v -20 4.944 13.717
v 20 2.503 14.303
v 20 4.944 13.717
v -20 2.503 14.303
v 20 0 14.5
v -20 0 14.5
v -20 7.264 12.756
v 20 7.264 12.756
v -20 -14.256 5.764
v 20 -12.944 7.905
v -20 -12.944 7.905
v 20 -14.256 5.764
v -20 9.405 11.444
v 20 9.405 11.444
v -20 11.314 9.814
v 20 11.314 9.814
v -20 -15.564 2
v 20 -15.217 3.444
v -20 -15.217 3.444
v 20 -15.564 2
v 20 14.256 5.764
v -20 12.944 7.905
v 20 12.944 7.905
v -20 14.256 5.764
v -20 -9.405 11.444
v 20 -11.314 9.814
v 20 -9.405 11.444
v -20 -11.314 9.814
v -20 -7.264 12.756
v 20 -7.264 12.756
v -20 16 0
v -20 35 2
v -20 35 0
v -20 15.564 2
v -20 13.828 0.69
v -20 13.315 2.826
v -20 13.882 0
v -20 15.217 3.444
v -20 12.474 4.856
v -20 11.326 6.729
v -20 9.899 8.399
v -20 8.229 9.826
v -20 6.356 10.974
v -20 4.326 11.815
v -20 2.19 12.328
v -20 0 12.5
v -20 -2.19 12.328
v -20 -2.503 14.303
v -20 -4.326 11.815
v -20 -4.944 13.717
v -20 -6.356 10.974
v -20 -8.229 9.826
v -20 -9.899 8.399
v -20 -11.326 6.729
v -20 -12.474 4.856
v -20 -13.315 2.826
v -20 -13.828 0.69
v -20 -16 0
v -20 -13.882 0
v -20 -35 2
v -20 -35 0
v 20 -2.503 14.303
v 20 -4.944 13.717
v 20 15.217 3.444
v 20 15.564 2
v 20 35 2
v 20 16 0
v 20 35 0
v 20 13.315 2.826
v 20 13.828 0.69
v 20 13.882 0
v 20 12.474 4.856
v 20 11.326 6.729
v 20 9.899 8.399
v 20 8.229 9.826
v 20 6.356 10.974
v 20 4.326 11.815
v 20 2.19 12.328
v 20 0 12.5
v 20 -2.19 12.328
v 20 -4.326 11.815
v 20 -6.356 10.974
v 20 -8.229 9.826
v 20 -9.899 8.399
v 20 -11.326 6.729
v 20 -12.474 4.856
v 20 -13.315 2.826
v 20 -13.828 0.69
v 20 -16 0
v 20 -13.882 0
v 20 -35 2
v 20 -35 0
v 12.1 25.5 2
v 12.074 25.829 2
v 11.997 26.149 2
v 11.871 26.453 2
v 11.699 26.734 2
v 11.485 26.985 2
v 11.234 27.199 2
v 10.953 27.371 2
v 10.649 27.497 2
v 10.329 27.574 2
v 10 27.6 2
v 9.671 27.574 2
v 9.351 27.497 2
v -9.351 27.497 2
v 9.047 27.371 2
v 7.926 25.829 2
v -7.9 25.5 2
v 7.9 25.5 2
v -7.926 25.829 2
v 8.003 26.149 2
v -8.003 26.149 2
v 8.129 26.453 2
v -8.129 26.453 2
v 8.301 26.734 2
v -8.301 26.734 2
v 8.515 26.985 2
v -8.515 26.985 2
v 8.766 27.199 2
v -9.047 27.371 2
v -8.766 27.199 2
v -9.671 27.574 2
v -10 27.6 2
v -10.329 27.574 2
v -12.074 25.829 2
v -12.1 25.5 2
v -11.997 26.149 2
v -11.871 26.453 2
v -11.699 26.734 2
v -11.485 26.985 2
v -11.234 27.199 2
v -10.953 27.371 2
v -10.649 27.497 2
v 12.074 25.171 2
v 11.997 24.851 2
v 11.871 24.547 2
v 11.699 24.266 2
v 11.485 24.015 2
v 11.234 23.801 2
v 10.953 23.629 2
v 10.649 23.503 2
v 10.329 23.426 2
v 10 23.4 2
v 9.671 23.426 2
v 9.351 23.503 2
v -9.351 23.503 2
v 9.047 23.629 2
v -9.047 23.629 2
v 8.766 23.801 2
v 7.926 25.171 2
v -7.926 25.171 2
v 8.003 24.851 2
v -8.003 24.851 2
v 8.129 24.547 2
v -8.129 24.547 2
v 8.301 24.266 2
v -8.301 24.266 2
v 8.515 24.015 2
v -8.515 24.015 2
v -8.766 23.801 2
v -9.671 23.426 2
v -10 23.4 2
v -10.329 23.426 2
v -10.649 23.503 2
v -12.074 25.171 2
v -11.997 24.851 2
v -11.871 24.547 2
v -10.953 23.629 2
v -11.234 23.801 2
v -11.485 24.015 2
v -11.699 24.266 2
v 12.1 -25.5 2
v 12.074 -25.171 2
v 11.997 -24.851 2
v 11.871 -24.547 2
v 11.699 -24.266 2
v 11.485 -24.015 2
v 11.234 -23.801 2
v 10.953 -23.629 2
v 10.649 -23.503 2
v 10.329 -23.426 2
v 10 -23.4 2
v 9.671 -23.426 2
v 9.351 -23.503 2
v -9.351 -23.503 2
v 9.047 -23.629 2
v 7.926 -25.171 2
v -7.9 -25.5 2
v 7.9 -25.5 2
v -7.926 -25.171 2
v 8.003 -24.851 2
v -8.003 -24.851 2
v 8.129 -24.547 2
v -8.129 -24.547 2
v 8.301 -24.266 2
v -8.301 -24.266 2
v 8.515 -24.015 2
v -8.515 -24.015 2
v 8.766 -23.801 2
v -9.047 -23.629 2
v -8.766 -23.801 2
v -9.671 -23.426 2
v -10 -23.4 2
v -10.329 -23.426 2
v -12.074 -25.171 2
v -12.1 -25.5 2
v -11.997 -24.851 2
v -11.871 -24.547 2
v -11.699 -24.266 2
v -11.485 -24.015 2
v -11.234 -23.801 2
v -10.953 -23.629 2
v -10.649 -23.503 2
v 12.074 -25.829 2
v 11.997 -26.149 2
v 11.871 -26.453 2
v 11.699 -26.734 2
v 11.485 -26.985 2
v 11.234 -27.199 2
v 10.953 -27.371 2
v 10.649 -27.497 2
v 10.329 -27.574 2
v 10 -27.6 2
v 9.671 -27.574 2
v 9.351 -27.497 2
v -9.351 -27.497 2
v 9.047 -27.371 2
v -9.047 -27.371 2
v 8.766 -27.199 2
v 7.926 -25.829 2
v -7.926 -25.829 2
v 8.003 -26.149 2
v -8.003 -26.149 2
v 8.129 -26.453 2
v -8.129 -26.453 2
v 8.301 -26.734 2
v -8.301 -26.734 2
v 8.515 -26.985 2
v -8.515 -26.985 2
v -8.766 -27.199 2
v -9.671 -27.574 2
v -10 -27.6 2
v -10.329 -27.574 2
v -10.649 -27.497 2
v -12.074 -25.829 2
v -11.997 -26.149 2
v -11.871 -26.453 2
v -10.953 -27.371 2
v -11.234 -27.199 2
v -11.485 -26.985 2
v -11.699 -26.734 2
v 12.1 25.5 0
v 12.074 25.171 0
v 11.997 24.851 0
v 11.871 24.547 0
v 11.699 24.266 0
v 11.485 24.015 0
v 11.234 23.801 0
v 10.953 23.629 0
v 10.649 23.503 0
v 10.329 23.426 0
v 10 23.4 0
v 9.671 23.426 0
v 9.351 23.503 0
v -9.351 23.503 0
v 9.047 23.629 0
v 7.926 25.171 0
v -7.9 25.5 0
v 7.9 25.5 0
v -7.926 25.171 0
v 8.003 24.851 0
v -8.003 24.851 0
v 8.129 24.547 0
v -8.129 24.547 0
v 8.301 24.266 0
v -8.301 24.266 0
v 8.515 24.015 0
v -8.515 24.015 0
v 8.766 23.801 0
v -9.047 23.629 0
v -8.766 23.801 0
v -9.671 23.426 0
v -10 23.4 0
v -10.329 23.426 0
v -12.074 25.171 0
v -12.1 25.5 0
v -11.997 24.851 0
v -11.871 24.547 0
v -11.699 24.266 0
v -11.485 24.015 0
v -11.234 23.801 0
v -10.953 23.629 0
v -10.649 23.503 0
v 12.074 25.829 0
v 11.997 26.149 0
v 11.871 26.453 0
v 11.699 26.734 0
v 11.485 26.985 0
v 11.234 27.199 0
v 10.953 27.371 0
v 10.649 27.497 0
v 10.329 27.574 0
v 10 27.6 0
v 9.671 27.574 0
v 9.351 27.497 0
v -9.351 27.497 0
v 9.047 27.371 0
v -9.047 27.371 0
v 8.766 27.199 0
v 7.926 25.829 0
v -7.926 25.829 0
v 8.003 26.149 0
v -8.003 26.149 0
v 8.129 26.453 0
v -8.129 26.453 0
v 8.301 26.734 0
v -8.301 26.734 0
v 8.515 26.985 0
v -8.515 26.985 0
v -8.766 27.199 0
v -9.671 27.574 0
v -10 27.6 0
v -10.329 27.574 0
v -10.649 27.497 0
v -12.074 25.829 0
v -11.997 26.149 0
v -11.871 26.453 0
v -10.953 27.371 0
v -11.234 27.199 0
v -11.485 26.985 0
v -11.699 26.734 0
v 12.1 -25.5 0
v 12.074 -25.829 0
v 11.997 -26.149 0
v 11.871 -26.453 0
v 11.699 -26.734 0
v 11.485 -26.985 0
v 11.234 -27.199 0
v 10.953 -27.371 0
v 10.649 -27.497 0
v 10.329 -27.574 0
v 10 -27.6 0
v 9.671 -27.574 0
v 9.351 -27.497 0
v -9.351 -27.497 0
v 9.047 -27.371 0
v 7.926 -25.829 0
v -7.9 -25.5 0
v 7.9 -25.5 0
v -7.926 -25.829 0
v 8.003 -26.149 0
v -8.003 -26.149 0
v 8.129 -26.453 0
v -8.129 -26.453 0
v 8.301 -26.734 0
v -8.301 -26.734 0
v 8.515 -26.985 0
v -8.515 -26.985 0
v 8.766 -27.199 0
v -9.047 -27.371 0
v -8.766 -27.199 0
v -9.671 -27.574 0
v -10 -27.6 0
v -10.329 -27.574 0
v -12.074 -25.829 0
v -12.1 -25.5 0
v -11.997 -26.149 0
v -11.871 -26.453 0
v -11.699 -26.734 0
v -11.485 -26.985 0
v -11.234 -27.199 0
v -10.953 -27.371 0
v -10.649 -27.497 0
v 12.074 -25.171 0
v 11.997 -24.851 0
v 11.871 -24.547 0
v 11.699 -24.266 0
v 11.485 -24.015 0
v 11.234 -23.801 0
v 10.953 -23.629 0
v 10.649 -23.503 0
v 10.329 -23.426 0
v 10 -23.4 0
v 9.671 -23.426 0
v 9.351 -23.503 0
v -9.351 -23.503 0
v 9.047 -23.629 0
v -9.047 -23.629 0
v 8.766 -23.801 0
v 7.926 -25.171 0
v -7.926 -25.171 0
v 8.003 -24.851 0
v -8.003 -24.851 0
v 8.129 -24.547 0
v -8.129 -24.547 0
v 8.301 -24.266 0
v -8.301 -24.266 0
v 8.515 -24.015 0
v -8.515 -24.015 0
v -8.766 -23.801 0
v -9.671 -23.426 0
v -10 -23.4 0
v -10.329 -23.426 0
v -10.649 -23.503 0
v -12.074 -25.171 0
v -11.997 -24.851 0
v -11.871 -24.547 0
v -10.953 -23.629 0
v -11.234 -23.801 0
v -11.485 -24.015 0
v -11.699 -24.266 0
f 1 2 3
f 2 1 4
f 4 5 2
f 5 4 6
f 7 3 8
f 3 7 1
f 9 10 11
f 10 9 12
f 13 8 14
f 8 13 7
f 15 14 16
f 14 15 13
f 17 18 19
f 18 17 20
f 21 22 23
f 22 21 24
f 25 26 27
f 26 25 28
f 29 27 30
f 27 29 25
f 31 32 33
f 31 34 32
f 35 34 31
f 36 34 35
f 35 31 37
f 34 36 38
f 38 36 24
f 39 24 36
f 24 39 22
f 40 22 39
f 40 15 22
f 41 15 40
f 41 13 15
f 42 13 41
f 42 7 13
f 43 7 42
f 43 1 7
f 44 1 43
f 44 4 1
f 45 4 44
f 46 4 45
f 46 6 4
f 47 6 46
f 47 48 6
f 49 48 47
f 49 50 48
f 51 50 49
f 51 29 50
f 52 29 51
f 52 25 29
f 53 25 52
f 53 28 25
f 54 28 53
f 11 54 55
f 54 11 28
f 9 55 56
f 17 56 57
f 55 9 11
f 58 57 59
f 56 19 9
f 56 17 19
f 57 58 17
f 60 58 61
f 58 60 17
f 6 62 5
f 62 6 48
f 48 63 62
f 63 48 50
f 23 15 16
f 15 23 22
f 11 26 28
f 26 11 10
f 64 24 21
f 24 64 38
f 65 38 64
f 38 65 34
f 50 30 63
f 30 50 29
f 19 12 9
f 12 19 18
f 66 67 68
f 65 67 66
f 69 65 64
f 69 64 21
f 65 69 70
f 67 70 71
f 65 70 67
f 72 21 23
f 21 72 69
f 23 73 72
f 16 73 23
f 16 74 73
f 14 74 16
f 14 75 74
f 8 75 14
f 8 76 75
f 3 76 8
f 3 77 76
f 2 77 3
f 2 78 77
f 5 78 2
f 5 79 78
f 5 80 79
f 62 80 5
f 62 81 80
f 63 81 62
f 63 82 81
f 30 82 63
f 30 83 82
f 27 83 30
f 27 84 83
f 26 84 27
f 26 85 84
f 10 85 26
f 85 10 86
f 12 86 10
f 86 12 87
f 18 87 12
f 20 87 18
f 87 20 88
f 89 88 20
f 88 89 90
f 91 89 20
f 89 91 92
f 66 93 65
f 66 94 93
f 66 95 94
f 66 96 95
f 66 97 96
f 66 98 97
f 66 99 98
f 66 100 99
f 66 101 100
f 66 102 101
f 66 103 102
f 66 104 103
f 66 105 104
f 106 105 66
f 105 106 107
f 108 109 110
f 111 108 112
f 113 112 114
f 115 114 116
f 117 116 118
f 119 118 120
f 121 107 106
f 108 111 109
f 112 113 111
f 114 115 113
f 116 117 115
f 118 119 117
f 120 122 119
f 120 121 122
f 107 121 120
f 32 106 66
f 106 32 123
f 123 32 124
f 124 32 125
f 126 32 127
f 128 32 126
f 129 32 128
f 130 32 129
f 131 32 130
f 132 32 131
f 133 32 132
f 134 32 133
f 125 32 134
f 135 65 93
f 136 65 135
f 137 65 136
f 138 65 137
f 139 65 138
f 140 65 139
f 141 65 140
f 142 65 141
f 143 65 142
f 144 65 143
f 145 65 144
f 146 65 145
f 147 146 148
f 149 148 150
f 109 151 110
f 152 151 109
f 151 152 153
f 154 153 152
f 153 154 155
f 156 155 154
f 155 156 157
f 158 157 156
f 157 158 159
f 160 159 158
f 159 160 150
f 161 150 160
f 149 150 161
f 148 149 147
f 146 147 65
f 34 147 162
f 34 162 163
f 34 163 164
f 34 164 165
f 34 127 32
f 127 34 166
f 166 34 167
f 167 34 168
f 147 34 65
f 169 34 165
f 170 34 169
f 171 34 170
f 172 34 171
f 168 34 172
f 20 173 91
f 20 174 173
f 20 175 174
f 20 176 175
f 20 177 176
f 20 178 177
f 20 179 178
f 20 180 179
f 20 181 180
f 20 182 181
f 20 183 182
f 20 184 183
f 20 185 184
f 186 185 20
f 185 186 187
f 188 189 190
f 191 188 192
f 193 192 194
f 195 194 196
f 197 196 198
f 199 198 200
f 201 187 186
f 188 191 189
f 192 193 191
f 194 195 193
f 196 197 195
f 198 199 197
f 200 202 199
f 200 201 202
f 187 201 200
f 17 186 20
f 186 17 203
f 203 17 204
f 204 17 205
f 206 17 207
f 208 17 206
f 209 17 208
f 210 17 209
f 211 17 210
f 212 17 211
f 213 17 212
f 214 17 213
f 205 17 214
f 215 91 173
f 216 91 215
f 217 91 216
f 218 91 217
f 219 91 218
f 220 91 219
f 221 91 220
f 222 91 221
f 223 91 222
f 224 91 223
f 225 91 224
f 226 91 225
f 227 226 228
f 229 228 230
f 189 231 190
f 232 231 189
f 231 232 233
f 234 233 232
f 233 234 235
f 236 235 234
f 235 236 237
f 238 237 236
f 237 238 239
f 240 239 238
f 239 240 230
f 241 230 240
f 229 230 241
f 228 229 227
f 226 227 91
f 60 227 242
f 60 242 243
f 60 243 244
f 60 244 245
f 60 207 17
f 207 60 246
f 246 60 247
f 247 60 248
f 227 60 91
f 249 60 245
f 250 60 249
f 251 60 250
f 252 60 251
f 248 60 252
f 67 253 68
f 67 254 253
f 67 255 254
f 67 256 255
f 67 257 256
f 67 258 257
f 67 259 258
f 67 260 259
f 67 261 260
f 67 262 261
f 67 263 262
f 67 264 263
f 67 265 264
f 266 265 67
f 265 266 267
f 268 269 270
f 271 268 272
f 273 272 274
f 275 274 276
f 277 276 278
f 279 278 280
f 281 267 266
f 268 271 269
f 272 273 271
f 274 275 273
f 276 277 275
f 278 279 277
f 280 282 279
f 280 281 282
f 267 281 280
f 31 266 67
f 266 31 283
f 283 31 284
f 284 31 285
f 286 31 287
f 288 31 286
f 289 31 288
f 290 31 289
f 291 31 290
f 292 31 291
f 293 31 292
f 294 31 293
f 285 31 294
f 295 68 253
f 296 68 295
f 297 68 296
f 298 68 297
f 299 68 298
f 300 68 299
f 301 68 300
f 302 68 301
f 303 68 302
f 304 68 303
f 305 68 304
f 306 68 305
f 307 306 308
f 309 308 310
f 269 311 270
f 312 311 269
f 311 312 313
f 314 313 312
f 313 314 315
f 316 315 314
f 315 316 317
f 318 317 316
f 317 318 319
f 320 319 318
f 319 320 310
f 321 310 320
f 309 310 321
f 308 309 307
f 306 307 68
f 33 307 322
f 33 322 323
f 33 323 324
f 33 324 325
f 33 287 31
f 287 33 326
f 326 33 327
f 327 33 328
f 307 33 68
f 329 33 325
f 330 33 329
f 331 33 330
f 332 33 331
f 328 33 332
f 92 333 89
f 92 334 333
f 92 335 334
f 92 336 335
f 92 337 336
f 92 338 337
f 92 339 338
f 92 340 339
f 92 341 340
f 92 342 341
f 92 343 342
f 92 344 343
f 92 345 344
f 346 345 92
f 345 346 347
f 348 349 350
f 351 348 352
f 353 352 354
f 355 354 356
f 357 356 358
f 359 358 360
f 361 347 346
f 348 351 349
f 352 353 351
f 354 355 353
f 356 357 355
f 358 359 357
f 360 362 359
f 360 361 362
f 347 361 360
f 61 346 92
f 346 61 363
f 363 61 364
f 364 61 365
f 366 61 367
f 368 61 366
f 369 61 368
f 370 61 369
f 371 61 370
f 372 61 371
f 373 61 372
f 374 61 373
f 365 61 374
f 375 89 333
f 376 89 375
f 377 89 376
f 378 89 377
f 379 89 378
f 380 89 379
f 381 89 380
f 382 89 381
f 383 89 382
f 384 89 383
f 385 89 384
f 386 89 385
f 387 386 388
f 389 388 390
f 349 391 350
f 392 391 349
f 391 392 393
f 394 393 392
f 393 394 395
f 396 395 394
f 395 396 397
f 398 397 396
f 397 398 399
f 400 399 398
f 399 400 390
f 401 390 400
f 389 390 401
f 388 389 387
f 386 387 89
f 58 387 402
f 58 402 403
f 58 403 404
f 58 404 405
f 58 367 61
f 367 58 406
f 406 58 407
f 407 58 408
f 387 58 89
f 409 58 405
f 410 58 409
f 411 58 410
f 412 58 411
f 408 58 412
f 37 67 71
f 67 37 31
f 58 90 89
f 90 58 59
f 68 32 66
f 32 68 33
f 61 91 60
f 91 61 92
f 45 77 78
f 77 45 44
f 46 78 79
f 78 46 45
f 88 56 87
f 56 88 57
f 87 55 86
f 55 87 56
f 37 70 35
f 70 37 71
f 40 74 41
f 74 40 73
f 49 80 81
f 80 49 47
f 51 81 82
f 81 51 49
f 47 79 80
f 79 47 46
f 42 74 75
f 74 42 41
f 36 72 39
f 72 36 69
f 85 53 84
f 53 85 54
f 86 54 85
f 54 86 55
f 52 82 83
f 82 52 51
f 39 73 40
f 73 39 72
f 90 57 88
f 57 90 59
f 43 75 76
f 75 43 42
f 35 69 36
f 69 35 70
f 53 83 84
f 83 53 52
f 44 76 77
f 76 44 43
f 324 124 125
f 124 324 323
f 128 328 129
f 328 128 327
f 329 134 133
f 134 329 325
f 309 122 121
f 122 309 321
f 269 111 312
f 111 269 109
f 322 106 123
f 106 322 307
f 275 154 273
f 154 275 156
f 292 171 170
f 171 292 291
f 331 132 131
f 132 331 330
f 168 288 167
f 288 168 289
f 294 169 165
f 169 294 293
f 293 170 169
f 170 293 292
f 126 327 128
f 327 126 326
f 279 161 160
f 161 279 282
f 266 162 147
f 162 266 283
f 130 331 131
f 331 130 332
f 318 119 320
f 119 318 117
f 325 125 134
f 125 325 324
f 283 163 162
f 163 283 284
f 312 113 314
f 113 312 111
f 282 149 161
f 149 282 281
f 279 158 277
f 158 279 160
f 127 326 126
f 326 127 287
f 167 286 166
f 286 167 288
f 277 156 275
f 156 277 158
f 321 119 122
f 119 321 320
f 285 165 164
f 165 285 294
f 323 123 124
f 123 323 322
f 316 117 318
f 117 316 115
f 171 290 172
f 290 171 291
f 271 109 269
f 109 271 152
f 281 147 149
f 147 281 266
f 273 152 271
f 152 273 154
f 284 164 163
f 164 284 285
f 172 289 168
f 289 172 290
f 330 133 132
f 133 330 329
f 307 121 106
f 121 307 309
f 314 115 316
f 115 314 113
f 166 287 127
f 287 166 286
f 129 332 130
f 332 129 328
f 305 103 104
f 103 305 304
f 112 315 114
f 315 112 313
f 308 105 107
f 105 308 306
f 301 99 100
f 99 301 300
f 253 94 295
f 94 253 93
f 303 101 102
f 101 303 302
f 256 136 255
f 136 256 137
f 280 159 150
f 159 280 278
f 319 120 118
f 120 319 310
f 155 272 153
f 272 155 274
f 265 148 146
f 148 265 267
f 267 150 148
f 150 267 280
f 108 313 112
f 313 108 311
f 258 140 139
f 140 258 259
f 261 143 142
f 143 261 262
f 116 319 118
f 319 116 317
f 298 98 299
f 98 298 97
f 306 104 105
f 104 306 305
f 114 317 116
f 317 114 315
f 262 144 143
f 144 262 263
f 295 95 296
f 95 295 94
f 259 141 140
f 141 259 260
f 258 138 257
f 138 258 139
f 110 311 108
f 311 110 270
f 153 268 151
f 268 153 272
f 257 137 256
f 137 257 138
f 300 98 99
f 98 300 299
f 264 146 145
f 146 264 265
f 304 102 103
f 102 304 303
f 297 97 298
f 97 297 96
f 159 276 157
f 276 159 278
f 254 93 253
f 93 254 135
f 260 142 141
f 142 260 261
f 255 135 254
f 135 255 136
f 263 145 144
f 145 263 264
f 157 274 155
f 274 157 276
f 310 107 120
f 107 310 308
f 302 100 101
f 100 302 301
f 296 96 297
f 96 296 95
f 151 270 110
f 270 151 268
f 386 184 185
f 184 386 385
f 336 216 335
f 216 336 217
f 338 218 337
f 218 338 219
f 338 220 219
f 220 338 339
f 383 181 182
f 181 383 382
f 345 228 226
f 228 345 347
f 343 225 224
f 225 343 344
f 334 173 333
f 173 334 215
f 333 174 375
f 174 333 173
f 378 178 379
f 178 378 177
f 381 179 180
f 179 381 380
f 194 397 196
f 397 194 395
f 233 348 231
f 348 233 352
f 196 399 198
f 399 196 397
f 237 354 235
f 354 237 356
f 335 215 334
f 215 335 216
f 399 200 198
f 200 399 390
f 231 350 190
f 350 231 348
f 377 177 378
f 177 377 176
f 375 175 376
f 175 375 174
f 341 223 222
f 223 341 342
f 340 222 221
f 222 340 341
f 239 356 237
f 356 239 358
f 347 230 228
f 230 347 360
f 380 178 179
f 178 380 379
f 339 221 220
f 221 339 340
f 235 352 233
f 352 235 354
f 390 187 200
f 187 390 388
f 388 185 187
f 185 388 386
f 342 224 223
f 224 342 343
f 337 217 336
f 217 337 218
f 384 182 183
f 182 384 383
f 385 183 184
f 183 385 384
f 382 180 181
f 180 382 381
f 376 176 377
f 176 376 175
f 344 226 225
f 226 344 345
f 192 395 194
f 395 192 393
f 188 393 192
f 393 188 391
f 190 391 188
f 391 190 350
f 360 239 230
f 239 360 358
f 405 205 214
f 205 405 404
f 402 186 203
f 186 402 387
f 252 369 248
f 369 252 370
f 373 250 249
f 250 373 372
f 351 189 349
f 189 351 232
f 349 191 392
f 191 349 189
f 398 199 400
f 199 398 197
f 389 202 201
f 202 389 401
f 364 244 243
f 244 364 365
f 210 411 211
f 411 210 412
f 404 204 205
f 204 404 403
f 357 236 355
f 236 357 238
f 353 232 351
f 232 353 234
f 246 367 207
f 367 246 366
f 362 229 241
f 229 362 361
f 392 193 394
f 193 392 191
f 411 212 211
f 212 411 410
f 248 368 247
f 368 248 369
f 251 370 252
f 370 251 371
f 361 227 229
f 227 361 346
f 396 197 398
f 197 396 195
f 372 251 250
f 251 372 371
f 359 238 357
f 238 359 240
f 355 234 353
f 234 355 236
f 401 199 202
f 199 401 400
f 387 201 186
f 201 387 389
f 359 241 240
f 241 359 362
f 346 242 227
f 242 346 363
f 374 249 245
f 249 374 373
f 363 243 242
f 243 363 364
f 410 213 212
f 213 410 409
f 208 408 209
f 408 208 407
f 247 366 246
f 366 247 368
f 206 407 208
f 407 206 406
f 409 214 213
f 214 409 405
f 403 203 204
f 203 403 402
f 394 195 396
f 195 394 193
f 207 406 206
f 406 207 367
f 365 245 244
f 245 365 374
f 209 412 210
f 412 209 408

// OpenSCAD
// file: ../SRC/WINDGAUGE01A_D02.scad
$fn=40; // model faces resolution.
include <../configuration.scad>



//Drzak na sloup - cast bez drzaku anemometru
module WINDGAUGE01A_D02(){
	
difference()
    {
    union()
        {
        //základní válec
        cylinder(h=D02_vyska_uchytky,r=(D02_prumer_obruby+2*D02_sila_materialu)/2,center=true);
		//úchytové plošky		
        translate([D02_dotahova_vzdalenost+D02_sila_materialu/2,0,0]){cube([D02_sila_materialu,D02_delka_celeho_uchytu,D02_vyska_uchytky],center=true);}
		}
    
    //válec na odečet
    cylinder(h=D02_vyska_uchytky+0.01,r=D02_prumer_obruby/2,center=true);     
	        
    //kvádr na odecet
	translate([D02_dotahova_vzdalenost-(D02_prumer_obruby+2*D02_sila_materialu)/2,0,0]){cube([D02_prumer_obruby+2*D02_sila_materialu,D02_prumer_obruby+2*D02_sila_materialu,D02_vyska_uchytky+0.01],center=true);}
		
	//otvory na sroub
	translate([D02_dotahova_vzdalenost,(D02_delka_celeho_uchytu/2-D02_prumer_obruby/2-D02_sila_materialu)/2+D02_prumer_obruby/2+D02_sila_materialu,D02_vyska_uchytky/4]){rotate([0,90,0]){cylinder(h=D02_sila_materialu+0.01,r=D02_prumer_uchytneho_sroubu/2);}}
        
    translate([D02_dotahova_vzdalenost,(D02_delka_celeho_uchytu/2-D02_prumer_obruby/2-D02_sila_materialu)/2+D02_prumer_obruby/2+D02_sila_materialu,-D02_vyska_uchytky/4]){rotate([0,90,0]){cylinder(h=D02_sila_materialu+0.01,r=D02_prumer_uchytneho_sroubu/2);}}
        
	translate([D02_dotahova_vzdalenost,-((D02_delka_celeho_uchytu/2-D02_prumer_obruby/2-D02_sila_materialu)/2+D02_prumer_obruby/2+D02_sila_materialu),-D02_vyska_uchytky/4]){rotate([0,90,0]){cylinder(h=D02_sila_materialu+0.01,r=D02_prumer_uchytneho_sroubu/2);}}

    translate([D02_dotahova_vzdalenost,-((D02_delka_celeho_uchytu/2-D02_prumer_obruby/2-D02_sila_materialu)/2+D02_prumer_obruby/2+D02_sila_materialu),D02_vyska_uchytky/4]){rotate([0,90,0]){cylinder(h=D02_sila_materialu+0.01,r=D02_prumer_uchytneho_sroubu/2);}}	
	
    }
}

//WINDGAUGE02A_D02();
// file: ../configuration.scad
$fn=40; // model faces resolution.

//OBECNE PARAMETRY 
//----------------------------------------------------------------
//----------------------------------------------------------------
//WINDGAUGE02A_S02 - Parametry pro hlavni valec anemometru
S01_hloubka_zavitu=4;
S01_vyska=80; //80
S01_prumer_vnitrni=46;
S01_sila_materialu=1.2;
S01_vyska_horni_zavit=10;
S01_vyska_spodniho_zavitu=10;
S01_sila_drzaku_RJ11=3; //vyška drážky
S01_hrana_A_RJ11=12.3;
S01_hrana_B_RJ11=19;
S01_tolerance_zavit=1.5;

//Rozměry ložiska se závity
LO_spodni_prumer=22;
LO_doraz_prumer=44.3;
LO_horni_prumer=7.7;
LO_vyska_spodni_doraz=5;
LO_vyska_horni_doraz=9;
LO_vyska_dorazu=0;



//Obecné parametry
prumer_osicky=5.1;

//Rozmery modulu se senzorem
senzor_delka=22;
senzor_sirka=20.4;
senzor_sila=2;


//Parametry loziska
lozisko_prumer_vnitrni=4.9;
lozisko_prumer_vnejsi=16.1;
lozisko_vyska=5;
lozisko_prekryv=1.5;

//Parametry magnetu
magnet_prumer=6.3;
magnet_vyska=5;
magnet_zapusteni=2;
magnet_tolerance_prumeru=0.2;

//Parametry sroubu
prumer_sroubu=3.4;
prumer_hlavy_sroubu=6;
vyska_hlavy_sroubu=4;
vyska_matky=3;
sirka_matky=6.7;

sirka_matky_tol=0.175;
prumer_orechu=10;

//WINDGAUGE02A_R01 //pro lopatku
L01_hrana_drzaku_a=10;
L01_hrana_drzaku_b=3;
L01_delka_uchytu=19;
L01_prumer_lopatky=40;
L01_sila_materialu_lopatky=0.9;

//WINDGAUGE02A_D01 //uchyt velky
D01_material_pod_zavitem=3;
D01_material_za_zavitem=3;
D01_material_pred_zavitem=2;
D01_delka_tyce=40;
D01_sirka_tyce=10;

//WINDGAUGE02A_D02 //uchyt na sloup
D02_sila_materialu=2;
D02_vyska_uchytky=40;
D02_prumer_obruby=28;
D02_delka_celeho_uchytu=70;
D02_dotahova_vzdalenost=1.5;
D02_prumer_uchytneho_sroubu=4.2;

//WINDGAUGE02A_R01 //rotor s prekritim statoru
R01_vyska_preryti_statoru=10;
R01_sila_materialu_pro_prekriti=1.3;
R01_mezera_mezi_statorem_rotorem=3;

//WINDGAUGE02A_R03 //drzak magnetu
R05_sirka_matky=10;



R03_prumer_zavitu=40;
R04_zavit_vyska=5;
R02_zavit_vyska=10;
R01_zavit_vyska=5;
R03_mezera_mezi_statorem_rotorem=3;

R02_delka_kridla=45;
R02_vyska_kridla=70;
R02_delka_vyrovnnavaci_tyce=35;
R02_hrana_drzaku=10;
R02_sila_materialu_pod_tyci=5;
// main file
$fn=100; // model faces resolution.
include <../configuration.scad>
use <../SRC/WINDGAUGE01A_D02.scad>

rotate([0, -90, 0])
    translate([-D02_dotahova_vzdalenost,0,0])
        WINDGAUGE01A_D02();

            
